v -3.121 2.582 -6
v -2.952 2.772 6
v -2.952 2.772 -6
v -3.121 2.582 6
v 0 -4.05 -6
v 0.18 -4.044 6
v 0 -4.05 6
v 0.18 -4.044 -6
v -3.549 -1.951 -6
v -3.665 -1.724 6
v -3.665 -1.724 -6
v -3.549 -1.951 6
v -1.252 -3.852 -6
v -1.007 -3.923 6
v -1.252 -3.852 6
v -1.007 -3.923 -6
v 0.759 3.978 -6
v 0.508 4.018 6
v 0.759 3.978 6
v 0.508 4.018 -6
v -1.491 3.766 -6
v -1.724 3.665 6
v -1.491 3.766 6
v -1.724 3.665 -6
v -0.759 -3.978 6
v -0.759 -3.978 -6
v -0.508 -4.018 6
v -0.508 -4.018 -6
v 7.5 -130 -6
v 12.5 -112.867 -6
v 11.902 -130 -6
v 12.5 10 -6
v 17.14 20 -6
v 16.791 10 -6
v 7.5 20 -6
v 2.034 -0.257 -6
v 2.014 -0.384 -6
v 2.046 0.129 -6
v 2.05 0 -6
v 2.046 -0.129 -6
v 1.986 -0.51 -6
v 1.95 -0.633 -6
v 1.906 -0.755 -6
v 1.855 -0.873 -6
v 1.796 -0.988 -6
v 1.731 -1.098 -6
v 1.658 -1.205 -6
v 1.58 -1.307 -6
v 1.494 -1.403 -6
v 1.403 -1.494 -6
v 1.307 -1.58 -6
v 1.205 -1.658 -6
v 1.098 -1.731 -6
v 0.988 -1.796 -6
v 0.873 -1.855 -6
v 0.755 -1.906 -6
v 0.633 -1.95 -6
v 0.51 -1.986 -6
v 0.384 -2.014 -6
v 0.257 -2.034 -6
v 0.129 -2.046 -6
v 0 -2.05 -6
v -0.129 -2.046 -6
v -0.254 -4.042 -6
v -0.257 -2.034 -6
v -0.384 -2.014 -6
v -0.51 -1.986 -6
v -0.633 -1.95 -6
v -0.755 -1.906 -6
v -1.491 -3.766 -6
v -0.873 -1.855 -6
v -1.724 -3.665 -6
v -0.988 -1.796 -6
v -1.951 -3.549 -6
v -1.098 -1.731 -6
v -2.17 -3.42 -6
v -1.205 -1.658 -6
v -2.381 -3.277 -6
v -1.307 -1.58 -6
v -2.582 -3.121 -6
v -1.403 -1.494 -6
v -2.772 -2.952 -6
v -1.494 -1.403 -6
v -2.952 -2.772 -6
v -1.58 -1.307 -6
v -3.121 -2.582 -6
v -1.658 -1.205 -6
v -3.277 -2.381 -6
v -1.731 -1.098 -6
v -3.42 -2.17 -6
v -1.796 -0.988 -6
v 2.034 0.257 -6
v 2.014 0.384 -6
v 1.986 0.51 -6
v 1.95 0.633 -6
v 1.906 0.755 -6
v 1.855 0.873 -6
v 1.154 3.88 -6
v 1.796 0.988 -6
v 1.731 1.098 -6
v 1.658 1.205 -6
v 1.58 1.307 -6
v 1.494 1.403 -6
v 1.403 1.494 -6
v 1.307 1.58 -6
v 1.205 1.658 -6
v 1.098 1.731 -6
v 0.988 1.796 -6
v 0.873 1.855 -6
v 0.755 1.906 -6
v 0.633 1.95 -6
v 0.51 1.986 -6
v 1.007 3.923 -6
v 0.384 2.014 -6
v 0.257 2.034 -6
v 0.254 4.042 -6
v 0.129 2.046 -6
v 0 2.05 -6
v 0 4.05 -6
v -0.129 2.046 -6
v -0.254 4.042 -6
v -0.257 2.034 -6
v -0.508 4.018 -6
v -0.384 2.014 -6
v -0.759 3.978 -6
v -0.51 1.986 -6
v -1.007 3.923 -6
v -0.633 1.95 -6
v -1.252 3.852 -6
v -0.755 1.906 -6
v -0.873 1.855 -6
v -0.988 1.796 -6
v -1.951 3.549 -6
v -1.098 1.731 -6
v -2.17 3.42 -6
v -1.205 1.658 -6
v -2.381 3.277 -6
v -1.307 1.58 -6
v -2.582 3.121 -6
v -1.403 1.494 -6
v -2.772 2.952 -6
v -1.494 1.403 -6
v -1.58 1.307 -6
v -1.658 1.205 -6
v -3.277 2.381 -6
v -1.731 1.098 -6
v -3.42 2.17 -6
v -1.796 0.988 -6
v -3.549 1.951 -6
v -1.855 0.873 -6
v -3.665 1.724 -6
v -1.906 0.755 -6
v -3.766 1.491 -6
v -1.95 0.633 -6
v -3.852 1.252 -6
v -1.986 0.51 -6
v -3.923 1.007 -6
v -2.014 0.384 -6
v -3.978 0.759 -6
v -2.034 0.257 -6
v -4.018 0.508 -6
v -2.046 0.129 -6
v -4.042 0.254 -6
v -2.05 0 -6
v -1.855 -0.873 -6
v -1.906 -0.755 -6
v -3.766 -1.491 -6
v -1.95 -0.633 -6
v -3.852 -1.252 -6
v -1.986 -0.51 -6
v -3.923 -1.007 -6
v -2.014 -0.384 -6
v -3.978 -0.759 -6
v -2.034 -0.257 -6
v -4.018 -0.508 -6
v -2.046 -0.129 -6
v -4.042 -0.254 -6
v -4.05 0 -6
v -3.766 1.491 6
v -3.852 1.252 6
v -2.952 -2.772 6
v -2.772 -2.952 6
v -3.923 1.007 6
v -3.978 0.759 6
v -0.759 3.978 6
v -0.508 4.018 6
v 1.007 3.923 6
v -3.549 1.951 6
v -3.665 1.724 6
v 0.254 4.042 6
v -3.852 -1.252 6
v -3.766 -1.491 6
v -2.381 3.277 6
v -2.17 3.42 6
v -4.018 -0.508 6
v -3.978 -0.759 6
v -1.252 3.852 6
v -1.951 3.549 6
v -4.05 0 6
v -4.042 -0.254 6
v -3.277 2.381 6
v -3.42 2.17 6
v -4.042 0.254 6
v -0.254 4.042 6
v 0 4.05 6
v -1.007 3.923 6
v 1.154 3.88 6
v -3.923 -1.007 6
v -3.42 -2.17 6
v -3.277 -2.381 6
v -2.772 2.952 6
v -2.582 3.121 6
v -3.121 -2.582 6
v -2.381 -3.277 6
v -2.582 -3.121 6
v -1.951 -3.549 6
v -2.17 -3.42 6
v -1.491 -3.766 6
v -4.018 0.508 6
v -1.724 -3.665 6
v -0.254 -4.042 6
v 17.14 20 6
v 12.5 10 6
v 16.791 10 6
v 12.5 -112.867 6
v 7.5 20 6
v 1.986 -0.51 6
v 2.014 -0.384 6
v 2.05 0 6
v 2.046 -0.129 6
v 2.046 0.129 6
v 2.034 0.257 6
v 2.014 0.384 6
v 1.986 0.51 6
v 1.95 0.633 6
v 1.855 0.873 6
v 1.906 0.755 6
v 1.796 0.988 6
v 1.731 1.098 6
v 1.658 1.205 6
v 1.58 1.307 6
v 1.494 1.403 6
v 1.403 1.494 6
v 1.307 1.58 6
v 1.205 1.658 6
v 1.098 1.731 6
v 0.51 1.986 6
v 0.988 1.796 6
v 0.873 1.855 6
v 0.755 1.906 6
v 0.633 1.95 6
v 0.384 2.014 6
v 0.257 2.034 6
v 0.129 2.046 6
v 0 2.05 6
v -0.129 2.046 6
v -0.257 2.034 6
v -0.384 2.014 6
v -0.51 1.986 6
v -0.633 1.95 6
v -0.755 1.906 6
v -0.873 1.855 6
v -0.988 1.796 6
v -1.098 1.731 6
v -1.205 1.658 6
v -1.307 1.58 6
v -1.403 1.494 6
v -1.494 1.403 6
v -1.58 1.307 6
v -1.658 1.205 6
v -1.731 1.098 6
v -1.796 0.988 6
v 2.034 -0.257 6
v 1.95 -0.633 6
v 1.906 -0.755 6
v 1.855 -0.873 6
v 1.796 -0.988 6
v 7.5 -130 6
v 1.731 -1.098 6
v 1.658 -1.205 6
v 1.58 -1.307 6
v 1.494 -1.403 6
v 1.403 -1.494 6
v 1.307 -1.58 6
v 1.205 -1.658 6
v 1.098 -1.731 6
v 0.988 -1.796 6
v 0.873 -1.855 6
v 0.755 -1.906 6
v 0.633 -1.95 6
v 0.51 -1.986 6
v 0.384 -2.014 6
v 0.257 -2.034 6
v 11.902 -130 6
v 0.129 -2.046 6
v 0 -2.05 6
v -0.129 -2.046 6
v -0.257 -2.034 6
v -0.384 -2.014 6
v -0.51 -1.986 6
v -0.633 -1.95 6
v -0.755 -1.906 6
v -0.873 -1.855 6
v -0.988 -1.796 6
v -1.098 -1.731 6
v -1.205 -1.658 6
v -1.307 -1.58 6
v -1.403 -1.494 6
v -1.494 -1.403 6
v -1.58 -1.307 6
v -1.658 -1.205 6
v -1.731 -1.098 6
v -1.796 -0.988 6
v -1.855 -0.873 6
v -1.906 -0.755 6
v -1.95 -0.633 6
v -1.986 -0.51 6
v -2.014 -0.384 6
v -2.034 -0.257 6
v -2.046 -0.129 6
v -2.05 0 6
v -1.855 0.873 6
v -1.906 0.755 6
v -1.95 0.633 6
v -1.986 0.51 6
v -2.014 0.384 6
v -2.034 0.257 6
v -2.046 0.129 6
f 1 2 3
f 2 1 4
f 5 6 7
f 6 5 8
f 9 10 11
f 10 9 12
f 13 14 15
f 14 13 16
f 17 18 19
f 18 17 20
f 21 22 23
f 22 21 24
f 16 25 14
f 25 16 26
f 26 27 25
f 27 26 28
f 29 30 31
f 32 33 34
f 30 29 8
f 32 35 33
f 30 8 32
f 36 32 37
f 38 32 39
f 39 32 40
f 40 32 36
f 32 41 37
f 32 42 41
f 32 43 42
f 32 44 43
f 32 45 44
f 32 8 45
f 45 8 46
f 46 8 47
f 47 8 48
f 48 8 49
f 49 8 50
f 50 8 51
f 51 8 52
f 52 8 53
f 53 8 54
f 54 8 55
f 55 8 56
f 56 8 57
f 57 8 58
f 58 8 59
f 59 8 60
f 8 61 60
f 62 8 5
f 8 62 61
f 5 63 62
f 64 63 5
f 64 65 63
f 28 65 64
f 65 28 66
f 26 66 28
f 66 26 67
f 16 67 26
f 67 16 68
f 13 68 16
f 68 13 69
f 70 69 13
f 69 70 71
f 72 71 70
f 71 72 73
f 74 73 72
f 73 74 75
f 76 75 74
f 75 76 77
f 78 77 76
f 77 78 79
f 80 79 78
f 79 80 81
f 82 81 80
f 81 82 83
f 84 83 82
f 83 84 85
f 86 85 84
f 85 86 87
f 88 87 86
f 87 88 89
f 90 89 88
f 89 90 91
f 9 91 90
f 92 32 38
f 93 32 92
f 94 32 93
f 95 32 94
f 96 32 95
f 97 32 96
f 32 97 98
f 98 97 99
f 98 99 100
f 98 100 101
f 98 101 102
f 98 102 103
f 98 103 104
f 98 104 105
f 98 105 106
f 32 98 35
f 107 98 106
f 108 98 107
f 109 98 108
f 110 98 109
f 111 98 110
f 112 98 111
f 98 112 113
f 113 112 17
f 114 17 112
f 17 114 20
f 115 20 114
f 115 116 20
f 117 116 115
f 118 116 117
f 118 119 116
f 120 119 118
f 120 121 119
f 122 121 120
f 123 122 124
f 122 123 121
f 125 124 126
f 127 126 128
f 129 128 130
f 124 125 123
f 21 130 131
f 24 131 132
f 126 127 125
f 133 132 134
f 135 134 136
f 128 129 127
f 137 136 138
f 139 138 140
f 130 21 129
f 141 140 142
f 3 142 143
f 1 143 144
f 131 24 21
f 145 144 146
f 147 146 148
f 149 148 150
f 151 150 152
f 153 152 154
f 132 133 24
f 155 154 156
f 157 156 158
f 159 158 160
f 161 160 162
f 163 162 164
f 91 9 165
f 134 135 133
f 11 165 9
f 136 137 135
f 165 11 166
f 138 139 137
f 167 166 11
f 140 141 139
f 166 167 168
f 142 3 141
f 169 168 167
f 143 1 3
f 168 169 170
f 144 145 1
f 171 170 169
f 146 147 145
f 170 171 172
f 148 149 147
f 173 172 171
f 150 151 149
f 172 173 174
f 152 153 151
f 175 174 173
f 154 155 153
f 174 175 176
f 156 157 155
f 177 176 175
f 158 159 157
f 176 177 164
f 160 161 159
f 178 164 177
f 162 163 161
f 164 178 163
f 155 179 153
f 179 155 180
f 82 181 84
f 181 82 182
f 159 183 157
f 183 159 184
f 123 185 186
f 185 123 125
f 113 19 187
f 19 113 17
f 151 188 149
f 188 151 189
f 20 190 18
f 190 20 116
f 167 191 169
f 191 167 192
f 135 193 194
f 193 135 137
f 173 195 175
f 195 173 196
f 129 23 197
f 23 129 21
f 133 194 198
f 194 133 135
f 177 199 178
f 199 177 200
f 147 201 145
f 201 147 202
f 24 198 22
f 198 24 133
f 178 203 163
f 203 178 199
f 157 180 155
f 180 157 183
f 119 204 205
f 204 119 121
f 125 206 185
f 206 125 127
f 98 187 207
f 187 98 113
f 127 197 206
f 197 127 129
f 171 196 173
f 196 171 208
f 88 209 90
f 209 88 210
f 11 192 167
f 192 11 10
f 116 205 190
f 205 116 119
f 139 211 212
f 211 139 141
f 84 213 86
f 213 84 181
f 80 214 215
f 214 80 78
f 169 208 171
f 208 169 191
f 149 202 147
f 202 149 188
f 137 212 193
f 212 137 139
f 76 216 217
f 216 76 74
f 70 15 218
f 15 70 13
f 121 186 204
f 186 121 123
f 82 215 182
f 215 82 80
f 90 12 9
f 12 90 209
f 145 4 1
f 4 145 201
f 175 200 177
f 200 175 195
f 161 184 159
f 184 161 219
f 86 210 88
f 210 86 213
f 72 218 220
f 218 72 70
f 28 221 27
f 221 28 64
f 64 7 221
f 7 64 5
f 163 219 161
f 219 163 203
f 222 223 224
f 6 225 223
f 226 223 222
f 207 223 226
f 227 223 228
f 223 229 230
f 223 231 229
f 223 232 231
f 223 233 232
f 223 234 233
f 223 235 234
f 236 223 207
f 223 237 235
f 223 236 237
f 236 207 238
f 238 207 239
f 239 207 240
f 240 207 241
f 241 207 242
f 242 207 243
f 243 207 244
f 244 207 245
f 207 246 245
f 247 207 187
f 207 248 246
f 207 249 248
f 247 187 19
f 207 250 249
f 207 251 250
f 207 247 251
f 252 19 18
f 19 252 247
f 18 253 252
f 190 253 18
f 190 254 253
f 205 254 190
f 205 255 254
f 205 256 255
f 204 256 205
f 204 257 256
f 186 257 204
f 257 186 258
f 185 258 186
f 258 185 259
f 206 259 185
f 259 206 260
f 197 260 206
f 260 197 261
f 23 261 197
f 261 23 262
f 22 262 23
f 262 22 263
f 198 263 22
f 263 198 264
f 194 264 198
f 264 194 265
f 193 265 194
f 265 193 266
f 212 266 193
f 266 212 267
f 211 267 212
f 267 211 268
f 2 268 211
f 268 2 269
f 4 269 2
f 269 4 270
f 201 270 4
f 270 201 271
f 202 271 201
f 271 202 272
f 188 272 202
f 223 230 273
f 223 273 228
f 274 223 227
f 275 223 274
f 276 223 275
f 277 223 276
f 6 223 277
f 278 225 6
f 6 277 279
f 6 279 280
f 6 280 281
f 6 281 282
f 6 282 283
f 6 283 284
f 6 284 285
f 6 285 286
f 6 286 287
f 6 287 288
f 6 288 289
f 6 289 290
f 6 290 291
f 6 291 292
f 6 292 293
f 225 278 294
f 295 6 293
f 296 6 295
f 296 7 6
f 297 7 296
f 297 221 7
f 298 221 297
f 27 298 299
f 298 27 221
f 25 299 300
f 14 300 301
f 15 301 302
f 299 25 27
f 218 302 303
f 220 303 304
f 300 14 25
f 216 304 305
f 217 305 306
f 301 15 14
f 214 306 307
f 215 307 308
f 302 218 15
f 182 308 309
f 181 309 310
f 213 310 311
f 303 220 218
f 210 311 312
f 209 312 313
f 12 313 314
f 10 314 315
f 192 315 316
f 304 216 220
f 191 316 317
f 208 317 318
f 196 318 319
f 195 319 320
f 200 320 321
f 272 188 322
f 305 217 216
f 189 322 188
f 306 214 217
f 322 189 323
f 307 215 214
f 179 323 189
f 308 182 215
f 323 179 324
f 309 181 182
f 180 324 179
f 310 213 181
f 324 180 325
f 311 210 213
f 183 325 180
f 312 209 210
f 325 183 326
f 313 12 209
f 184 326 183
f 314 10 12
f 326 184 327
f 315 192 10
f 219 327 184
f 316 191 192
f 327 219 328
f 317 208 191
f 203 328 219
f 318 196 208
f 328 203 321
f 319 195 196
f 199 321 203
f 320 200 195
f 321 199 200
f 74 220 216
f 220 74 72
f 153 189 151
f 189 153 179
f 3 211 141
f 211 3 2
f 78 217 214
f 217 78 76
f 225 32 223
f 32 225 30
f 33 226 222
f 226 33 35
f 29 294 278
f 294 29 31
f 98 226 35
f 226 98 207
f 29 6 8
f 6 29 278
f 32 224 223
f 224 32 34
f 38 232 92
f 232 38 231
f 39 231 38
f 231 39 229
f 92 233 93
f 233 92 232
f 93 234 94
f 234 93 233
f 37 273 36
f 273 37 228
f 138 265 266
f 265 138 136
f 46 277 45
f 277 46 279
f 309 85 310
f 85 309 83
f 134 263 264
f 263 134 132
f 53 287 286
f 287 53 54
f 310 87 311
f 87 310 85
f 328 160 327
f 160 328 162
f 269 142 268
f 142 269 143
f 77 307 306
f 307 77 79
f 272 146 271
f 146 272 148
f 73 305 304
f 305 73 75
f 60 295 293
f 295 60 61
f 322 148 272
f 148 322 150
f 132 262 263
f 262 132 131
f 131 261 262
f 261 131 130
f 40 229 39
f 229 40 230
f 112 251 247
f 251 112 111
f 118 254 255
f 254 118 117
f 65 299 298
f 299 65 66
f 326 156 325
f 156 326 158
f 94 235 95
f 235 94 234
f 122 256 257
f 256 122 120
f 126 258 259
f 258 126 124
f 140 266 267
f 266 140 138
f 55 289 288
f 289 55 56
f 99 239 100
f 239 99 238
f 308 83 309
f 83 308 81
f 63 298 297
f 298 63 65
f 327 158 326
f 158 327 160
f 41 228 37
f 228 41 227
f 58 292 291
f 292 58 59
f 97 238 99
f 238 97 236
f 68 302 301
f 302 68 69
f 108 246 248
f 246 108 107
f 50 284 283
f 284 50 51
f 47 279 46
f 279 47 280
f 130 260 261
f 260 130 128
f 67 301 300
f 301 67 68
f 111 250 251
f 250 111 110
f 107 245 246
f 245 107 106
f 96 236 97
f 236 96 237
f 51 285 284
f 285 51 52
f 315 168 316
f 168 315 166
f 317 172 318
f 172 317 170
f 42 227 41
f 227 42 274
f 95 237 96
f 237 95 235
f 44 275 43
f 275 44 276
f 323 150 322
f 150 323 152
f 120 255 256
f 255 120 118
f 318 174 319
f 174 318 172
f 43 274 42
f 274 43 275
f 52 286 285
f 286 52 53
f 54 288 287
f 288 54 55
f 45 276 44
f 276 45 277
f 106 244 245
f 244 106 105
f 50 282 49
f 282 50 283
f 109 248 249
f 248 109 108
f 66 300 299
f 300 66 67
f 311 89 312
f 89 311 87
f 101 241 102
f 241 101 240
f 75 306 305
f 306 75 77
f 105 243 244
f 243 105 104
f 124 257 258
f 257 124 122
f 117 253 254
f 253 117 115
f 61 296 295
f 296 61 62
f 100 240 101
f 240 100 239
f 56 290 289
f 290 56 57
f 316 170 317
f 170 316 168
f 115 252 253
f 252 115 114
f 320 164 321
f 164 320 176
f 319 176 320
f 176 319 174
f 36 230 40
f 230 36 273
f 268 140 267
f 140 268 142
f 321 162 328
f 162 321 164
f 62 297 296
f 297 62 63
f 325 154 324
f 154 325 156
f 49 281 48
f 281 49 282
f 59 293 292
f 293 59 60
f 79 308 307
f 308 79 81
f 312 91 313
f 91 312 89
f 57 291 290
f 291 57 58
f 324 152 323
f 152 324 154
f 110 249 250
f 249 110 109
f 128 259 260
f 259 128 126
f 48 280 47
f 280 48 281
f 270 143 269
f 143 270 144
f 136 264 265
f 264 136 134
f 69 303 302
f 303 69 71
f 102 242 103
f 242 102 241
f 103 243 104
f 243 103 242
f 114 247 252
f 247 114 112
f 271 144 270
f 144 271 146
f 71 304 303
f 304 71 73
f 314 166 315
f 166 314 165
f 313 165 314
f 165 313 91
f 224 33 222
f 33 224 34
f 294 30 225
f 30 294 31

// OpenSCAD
/*
    Wolfcraft - Backen
    
    ein weiterer Versuch, eigene Backen für die Wolfkraft-Zwingen
    zu modellieren
    
    + Wolfcraft FZH 40 Ergo-Federzwinge 3626000
    + Wolfcraft FZ 40 Federzwinge 3630000

    Gedruckt mit 60% Füllung.
*/

$fn = $preview ? 20 : 100;


pindm = 3.9 + 0.2;      // Durchmesser des Pinlochs
pinbreite = 12.0;         // Breite des Pinzylinders
pinwandst = 2.0;         // Wandstärke des Pinlochs

backenbreite = 150.0;
backenlaenge = 12.0;
backendicke = 5.0;
backenoffset = 10.0;
backendelta = 20.0;

// die beiden Stege
stegachse = true;          // ohne diesen macht es keinen Sinn!
stegquer = true;
mittelfase = true;          // die "Zentrierfase" in der Mitte, 45° ohne Stützstruktur

steg = [ 
    [0,-pindm/2.0-pinwandst+5],
    [0,+pindm/2.0+pinwandst-5],
    [backenoffset-backendicke/2.0,-backenbreite+backendelta],
    [backenoffset-backendicke/2.0,backendelta]
    ];
stegpkt = [[0,1,2,3]];

steif = [ 
    [pindm/2.0+pinwandst,-pinbreite/2.0],
    [pindm/2.0+pinwandst,+pinbreite/2.0],
    [backenoffset-backendicke/2.0,backenlaenge/2.0],
    [backenoffset-backendicke/2.0,-backenlaenge/2.0]
    ];
steifpkt = [[0,1,2,3]];

pofs = 0;
pgrid = 0.5;
p45 = [[0,0],[-pgrid,0],[pgrid,-pgrid]];
pp45 = [[0,1,2]];

// die Mittelfase
nutgrid = 1.5;
nut45 = [[-nutgrid,0],[0,nutgrid],[0,-nutgrid]];
nnut45 = [[0,1,2]];


difference() {
    union() {
        cylinder(h=pinbreite,d=pindm+2*pinwandst, center=true);
        
        color("red")
        translate([backenoffset,-backenbreite/2.0+backendelta,0])
        cube([backendicke,backenbreite,backenlaenge], center=true);
        
        // der Steg in Achsenausrichtung
        if (stegachse) {
            color("blue")
            linear_extrude(height = pinbreite, center = true, 
                                   convexity = 10, twist = 0)
            polygon(steg,stegpkt);
        }
        
        // der Steg in Querrichtung
        if (stegquer) {
        color("green")
            rotate([90,0,0])
            linear_extrude(height=pindm+2.0*pinwandst, center = true, 
                                   convexity = 10, twist = 0)
            polygon(steif,steifpkt);
        }
        
        // Der Spreizer
        translate([15,backendelta-5,0])
        cube([10,10,backenlaenge],center=true);
        
    }
    
    union() {
        cylinder(h=pinbreite,d=pindm, center=true);

        translate([19,-70,0])
        rotate([0,0,-2])
        cube([10,200,40],center=true);
    }
}
